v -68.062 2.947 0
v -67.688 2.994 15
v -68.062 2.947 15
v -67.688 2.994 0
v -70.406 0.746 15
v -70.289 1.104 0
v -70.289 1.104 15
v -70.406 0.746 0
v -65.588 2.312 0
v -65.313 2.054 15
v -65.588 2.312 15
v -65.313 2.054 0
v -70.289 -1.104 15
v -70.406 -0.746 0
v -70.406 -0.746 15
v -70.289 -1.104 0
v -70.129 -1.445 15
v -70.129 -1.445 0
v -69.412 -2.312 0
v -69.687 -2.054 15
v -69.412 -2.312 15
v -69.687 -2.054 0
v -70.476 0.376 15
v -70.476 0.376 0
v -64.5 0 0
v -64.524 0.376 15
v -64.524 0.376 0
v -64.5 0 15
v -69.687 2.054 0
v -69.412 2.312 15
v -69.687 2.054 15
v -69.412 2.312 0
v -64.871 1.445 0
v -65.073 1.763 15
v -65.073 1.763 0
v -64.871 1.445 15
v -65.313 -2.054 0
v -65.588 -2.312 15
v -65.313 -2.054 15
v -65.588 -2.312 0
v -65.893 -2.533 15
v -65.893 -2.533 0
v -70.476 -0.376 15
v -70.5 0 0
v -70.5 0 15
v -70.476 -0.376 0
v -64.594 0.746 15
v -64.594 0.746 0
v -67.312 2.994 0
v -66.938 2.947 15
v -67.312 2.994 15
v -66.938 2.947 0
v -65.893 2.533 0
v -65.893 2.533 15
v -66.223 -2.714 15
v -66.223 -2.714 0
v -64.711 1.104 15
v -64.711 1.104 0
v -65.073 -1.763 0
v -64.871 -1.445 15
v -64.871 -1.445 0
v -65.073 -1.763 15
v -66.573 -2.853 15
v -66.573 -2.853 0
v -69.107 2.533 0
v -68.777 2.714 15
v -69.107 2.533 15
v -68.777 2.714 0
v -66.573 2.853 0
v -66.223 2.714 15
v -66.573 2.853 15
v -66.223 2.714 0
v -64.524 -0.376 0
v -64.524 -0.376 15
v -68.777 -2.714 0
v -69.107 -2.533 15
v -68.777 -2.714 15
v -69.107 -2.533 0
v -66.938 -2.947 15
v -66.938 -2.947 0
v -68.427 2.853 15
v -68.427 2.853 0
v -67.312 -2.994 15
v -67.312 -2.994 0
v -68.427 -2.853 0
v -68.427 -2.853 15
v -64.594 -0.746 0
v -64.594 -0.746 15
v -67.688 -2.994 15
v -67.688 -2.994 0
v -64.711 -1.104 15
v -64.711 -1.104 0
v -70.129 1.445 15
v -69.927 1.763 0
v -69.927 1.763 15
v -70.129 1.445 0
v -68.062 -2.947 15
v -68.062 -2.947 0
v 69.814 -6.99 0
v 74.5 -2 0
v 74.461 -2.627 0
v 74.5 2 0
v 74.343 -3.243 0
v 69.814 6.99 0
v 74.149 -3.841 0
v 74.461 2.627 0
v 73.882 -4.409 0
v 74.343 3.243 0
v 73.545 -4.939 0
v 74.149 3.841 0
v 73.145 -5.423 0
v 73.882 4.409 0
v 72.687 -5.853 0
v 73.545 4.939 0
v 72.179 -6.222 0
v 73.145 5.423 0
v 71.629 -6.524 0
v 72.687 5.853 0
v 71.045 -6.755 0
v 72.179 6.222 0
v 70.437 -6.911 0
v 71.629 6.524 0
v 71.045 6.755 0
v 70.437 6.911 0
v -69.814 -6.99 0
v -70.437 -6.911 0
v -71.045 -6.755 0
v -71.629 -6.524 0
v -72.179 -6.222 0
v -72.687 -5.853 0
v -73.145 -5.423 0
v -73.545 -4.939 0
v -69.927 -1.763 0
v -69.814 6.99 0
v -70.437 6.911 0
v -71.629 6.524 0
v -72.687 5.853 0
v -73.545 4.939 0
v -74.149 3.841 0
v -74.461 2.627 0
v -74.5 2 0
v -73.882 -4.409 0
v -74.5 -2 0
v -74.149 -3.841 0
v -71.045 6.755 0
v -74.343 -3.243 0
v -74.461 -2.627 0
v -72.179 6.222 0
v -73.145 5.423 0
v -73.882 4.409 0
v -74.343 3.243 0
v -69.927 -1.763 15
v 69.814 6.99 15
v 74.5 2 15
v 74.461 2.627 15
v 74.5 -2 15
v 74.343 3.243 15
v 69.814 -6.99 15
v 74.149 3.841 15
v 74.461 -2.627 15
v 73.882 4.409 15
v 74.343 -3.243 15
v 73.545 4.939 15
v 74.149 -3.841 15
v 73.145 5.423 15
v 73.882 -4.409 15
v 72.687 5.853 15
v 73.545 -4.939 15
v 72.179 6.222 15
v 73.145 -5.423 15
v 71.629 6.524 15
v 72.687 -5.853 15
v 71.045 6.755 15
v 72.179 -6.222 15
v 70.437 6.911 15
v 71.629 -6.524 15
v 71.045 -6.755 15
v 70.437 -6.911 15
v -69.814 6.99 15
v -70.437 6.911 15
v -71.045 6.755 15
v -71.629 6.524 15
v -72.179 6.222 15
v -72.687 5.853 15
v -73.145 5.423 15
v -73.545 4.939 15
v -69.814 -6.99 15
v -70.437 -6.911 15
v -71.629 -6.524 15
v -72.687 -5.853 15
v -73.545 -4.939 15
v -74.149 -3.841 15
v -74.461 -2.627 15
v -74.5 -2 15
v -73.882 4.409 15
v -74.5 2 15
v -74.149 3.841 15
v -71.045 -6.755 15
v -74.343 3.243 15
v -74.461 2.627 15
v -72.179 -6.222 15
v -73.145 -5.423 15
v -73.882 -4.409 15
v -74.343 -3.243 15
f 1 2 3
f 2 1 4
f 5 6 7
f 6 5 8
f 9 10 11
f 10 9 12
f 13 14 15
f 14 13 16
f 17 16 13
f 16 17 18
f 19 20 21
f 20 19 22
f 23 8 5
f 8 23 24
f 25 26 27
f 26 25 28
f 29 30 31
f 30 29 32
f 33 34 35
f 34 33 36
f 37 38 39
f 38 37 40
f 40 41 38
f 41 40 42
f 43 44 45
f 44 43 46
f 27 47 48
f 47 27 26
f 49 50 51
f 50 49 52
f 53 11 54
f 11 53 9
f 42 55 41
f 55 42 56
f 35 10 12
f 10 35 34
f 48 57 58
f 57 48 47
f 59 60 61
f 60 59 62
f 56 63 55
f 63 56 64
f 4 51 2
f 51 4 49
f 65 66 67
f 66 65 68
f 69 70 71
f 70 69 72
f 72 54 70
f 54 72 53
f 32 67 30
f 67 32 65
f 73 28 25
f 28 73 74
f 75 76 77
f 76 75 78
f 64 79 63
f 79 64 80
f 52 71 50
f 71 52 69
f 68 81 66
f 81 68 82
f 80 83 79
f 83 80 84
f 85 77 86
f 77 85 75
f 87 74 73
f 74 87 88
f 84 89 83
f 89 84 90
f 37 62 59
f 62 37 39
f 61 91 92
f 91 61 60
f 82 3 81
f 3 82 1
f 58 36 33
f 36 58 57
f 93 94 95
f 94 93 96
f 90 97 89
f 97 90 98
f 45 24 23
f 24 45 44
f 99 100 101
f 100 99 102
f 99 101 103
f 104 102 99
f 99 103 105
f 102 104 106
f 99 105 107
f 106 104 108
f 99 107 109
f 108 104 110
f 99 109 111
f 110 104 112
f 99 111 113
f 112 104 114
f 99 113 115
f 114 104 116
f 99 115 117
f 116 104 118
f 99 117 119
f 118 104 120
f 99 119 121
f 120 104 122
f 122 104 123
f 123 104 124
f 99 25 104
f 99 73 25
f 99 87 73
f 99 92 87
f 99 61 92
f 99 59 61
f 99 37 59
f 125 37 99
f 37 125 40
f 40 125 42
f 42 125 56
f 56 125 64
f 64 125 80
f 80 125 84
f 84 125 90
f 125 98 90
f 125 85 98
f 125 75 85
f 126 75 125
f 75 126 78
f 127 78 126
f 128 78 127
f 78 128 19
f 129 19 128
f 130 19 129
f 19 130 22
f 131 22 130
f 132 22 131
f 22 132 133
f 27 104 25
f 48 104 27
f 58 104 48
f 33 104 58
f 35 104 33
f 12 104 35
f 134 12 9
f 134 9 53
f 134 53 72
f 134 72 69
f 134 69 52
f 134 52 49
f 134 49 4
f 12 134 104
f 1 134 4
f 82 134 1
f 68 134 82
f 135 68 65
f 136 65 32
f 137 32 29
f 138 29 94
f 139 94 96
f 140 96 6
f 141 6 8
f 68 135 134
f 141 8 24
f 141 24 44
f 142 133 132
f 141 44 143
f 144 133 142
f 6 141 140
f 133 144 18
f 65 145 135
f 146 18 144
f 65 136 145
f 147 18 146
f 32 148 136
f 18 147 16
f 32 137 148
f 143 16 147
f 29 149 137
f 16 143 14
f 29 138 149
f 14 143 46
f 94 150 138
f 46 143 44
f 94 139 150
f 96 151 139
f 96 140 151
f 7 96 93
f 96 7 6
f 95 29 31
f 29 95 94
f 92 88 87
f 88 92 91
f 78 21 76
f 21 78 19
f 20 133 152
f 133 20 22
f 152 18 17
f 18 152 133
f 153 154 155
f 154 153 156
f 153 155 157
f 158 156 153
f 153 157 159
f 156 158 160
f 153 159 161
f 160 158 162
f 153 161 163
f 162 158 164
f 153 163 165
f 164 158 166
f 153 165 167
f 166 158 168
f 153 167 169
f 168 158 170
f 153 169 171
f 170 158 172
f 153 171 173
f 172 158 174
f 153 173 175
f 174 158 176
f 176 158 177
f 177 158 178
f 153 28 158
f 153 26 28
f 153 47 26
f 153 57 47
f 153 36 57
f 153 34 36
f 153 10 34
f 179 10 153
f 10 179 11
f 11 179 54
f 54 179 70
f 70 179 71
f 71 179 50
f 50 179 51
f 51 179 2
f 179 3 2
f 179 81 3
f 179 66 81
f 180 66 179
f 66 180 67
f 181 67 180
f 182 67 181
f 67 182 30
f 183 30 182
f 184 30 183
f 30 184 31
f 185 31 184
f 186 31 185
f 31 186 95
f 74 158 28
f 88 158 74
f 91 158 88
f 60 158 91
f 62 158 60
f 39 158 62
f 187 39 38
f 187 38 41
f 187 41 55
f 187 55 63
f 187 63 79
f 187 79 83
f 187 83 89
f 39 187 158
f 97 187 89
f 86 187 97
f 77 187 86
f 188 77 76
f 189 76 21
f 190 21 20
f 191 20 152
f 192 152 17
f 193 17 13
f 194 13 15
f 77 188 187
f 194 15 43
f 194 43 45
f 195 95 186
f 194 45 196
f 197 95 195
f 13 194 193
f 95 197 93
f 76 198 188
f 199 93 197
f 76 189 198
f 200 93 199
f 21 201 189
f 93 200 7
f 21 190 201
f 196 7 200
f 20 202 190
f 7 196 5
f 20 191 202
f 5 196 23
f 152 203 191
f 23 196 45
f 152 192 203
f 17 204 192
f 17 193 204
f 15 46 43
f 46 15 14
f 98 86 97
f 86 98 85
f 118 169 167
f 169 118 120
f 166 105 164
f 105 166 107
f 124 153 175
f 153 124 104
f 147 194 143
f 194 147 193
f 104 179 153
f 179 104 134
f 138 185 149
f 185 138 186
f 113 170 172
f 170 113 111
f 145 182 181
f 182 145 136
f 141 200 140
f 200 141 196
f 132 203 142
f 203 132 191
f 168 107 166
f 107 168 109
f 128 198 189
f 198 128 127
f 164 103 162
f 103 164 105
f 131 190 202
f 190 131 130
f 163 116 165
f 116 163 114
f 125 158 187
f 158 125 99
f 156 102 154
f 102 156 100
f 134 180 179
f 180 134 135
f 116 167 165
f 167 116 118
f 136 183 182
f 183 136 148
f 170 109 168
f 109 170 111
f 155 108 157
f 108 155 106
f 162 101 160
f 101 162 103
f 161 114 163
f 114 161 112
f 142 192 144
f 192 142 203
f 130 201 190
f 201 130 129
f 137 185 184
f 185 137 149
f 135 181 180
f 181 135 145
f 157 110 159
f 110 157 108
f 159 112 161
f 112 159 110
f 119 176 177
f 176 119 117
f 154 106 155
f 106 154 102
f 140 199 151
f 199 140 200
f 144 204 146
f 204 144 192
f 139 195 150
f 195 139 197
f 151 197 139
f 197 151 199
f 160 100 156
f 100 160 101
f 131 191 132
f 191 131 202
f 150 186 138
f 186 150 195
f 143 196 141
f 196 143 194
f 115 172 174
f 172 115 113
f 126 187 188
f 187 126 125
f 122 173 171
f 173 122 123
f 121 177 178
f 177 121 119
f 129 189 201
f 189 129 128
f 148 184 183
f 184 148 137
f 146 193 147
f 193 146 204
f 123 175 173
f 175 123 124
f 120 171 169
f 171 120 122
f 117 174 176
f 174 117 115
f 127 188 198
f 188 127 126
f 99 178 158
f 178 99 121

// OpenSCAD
$fn = 50;


difference() {
	union() {
		hull() {
			translate(v = [-69.5000000000, 2.0000000000, 0]) {
				cylinder(h = 15, r = 5);
			}
			translate(v = [69.5000000000, 2.0000000000, 0]) {
				cylinder(h = 15, r = 5);
			}
			translate(v = [-69.5000000000, -2.0000000000, 0]) {
				cylinder(h = 15, r = 5);
			}
			translate(v = [69.5000000000, -2.0000000000, 0]) {
				cylinder(h = 15, r = 5);
			}
		}
	}
	union() {
		translate(v = [-67.5000000000, 0.0000000000, 0]) {
			cylinder(h = 15, r = 3.0000000000);
		}
		translate(v = [-67.5000000000, 0.0000000000, 0]) {
			cylinder(h = 15, r = 1.5000000000);
		}
		translate(v = [-67.5000000000, 0.0000000000, 0]) {
			cylinder(h = 15, r = 1.5000000000);
		}
		translate(v = [-67.5000000000, 0.0000000000, 0]) {
			cylinder(h = 15, r = 1.5000000000);
		}
	}
}
